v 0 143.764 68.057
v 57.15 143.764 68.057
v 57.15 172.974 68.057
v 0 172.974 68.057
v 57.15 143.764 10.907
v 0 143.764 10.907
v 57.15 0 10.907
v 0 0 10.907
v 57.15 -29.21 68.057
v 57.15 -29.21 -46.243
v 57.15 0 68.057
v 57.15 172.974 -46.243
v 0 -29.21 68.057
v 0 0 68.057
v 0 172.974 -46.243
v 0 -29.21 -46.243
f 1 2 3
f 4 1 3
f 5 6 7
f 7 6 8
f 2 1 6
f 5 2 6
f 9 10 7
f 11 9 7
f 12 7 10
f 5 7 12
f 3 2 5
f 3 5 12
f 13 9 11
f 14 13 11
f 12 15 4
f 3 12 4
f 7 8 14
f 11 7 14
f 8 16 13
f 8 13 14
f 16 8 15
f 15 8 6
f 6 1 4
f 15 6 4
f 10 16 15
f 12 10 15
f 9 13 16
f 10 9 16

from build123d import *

# Parameters (mm, degrees)
F0_W     = 29.21
F0_H     = 57.15
F0_W_2   = 143.764
F1_DEPTH = 57.15


with BuildPart() as f1:
    # F0 (on Right) → F1 (new body)
    with BuildSketch(Plane.YZ):
        with Locations((158.369, 39.481787)):
            Rectangle(F0_W, F0_H)
        with Locations((158.369, -17.668213)):
            Rectangle(F0_W, F0_H)
        with Locations((71.882, -17.668213)):
            Rectangle(F0_W_2, F0_H)
        with Locations((-14.605, -17.668213)):
            Rectangle(F0_W, F0_H)
        with Locations((-14.605, 39.481787)):
            Rectangle(F0_W, F0_H)
    extrude(amount=F1_DEPTH)


solid = f1.part
